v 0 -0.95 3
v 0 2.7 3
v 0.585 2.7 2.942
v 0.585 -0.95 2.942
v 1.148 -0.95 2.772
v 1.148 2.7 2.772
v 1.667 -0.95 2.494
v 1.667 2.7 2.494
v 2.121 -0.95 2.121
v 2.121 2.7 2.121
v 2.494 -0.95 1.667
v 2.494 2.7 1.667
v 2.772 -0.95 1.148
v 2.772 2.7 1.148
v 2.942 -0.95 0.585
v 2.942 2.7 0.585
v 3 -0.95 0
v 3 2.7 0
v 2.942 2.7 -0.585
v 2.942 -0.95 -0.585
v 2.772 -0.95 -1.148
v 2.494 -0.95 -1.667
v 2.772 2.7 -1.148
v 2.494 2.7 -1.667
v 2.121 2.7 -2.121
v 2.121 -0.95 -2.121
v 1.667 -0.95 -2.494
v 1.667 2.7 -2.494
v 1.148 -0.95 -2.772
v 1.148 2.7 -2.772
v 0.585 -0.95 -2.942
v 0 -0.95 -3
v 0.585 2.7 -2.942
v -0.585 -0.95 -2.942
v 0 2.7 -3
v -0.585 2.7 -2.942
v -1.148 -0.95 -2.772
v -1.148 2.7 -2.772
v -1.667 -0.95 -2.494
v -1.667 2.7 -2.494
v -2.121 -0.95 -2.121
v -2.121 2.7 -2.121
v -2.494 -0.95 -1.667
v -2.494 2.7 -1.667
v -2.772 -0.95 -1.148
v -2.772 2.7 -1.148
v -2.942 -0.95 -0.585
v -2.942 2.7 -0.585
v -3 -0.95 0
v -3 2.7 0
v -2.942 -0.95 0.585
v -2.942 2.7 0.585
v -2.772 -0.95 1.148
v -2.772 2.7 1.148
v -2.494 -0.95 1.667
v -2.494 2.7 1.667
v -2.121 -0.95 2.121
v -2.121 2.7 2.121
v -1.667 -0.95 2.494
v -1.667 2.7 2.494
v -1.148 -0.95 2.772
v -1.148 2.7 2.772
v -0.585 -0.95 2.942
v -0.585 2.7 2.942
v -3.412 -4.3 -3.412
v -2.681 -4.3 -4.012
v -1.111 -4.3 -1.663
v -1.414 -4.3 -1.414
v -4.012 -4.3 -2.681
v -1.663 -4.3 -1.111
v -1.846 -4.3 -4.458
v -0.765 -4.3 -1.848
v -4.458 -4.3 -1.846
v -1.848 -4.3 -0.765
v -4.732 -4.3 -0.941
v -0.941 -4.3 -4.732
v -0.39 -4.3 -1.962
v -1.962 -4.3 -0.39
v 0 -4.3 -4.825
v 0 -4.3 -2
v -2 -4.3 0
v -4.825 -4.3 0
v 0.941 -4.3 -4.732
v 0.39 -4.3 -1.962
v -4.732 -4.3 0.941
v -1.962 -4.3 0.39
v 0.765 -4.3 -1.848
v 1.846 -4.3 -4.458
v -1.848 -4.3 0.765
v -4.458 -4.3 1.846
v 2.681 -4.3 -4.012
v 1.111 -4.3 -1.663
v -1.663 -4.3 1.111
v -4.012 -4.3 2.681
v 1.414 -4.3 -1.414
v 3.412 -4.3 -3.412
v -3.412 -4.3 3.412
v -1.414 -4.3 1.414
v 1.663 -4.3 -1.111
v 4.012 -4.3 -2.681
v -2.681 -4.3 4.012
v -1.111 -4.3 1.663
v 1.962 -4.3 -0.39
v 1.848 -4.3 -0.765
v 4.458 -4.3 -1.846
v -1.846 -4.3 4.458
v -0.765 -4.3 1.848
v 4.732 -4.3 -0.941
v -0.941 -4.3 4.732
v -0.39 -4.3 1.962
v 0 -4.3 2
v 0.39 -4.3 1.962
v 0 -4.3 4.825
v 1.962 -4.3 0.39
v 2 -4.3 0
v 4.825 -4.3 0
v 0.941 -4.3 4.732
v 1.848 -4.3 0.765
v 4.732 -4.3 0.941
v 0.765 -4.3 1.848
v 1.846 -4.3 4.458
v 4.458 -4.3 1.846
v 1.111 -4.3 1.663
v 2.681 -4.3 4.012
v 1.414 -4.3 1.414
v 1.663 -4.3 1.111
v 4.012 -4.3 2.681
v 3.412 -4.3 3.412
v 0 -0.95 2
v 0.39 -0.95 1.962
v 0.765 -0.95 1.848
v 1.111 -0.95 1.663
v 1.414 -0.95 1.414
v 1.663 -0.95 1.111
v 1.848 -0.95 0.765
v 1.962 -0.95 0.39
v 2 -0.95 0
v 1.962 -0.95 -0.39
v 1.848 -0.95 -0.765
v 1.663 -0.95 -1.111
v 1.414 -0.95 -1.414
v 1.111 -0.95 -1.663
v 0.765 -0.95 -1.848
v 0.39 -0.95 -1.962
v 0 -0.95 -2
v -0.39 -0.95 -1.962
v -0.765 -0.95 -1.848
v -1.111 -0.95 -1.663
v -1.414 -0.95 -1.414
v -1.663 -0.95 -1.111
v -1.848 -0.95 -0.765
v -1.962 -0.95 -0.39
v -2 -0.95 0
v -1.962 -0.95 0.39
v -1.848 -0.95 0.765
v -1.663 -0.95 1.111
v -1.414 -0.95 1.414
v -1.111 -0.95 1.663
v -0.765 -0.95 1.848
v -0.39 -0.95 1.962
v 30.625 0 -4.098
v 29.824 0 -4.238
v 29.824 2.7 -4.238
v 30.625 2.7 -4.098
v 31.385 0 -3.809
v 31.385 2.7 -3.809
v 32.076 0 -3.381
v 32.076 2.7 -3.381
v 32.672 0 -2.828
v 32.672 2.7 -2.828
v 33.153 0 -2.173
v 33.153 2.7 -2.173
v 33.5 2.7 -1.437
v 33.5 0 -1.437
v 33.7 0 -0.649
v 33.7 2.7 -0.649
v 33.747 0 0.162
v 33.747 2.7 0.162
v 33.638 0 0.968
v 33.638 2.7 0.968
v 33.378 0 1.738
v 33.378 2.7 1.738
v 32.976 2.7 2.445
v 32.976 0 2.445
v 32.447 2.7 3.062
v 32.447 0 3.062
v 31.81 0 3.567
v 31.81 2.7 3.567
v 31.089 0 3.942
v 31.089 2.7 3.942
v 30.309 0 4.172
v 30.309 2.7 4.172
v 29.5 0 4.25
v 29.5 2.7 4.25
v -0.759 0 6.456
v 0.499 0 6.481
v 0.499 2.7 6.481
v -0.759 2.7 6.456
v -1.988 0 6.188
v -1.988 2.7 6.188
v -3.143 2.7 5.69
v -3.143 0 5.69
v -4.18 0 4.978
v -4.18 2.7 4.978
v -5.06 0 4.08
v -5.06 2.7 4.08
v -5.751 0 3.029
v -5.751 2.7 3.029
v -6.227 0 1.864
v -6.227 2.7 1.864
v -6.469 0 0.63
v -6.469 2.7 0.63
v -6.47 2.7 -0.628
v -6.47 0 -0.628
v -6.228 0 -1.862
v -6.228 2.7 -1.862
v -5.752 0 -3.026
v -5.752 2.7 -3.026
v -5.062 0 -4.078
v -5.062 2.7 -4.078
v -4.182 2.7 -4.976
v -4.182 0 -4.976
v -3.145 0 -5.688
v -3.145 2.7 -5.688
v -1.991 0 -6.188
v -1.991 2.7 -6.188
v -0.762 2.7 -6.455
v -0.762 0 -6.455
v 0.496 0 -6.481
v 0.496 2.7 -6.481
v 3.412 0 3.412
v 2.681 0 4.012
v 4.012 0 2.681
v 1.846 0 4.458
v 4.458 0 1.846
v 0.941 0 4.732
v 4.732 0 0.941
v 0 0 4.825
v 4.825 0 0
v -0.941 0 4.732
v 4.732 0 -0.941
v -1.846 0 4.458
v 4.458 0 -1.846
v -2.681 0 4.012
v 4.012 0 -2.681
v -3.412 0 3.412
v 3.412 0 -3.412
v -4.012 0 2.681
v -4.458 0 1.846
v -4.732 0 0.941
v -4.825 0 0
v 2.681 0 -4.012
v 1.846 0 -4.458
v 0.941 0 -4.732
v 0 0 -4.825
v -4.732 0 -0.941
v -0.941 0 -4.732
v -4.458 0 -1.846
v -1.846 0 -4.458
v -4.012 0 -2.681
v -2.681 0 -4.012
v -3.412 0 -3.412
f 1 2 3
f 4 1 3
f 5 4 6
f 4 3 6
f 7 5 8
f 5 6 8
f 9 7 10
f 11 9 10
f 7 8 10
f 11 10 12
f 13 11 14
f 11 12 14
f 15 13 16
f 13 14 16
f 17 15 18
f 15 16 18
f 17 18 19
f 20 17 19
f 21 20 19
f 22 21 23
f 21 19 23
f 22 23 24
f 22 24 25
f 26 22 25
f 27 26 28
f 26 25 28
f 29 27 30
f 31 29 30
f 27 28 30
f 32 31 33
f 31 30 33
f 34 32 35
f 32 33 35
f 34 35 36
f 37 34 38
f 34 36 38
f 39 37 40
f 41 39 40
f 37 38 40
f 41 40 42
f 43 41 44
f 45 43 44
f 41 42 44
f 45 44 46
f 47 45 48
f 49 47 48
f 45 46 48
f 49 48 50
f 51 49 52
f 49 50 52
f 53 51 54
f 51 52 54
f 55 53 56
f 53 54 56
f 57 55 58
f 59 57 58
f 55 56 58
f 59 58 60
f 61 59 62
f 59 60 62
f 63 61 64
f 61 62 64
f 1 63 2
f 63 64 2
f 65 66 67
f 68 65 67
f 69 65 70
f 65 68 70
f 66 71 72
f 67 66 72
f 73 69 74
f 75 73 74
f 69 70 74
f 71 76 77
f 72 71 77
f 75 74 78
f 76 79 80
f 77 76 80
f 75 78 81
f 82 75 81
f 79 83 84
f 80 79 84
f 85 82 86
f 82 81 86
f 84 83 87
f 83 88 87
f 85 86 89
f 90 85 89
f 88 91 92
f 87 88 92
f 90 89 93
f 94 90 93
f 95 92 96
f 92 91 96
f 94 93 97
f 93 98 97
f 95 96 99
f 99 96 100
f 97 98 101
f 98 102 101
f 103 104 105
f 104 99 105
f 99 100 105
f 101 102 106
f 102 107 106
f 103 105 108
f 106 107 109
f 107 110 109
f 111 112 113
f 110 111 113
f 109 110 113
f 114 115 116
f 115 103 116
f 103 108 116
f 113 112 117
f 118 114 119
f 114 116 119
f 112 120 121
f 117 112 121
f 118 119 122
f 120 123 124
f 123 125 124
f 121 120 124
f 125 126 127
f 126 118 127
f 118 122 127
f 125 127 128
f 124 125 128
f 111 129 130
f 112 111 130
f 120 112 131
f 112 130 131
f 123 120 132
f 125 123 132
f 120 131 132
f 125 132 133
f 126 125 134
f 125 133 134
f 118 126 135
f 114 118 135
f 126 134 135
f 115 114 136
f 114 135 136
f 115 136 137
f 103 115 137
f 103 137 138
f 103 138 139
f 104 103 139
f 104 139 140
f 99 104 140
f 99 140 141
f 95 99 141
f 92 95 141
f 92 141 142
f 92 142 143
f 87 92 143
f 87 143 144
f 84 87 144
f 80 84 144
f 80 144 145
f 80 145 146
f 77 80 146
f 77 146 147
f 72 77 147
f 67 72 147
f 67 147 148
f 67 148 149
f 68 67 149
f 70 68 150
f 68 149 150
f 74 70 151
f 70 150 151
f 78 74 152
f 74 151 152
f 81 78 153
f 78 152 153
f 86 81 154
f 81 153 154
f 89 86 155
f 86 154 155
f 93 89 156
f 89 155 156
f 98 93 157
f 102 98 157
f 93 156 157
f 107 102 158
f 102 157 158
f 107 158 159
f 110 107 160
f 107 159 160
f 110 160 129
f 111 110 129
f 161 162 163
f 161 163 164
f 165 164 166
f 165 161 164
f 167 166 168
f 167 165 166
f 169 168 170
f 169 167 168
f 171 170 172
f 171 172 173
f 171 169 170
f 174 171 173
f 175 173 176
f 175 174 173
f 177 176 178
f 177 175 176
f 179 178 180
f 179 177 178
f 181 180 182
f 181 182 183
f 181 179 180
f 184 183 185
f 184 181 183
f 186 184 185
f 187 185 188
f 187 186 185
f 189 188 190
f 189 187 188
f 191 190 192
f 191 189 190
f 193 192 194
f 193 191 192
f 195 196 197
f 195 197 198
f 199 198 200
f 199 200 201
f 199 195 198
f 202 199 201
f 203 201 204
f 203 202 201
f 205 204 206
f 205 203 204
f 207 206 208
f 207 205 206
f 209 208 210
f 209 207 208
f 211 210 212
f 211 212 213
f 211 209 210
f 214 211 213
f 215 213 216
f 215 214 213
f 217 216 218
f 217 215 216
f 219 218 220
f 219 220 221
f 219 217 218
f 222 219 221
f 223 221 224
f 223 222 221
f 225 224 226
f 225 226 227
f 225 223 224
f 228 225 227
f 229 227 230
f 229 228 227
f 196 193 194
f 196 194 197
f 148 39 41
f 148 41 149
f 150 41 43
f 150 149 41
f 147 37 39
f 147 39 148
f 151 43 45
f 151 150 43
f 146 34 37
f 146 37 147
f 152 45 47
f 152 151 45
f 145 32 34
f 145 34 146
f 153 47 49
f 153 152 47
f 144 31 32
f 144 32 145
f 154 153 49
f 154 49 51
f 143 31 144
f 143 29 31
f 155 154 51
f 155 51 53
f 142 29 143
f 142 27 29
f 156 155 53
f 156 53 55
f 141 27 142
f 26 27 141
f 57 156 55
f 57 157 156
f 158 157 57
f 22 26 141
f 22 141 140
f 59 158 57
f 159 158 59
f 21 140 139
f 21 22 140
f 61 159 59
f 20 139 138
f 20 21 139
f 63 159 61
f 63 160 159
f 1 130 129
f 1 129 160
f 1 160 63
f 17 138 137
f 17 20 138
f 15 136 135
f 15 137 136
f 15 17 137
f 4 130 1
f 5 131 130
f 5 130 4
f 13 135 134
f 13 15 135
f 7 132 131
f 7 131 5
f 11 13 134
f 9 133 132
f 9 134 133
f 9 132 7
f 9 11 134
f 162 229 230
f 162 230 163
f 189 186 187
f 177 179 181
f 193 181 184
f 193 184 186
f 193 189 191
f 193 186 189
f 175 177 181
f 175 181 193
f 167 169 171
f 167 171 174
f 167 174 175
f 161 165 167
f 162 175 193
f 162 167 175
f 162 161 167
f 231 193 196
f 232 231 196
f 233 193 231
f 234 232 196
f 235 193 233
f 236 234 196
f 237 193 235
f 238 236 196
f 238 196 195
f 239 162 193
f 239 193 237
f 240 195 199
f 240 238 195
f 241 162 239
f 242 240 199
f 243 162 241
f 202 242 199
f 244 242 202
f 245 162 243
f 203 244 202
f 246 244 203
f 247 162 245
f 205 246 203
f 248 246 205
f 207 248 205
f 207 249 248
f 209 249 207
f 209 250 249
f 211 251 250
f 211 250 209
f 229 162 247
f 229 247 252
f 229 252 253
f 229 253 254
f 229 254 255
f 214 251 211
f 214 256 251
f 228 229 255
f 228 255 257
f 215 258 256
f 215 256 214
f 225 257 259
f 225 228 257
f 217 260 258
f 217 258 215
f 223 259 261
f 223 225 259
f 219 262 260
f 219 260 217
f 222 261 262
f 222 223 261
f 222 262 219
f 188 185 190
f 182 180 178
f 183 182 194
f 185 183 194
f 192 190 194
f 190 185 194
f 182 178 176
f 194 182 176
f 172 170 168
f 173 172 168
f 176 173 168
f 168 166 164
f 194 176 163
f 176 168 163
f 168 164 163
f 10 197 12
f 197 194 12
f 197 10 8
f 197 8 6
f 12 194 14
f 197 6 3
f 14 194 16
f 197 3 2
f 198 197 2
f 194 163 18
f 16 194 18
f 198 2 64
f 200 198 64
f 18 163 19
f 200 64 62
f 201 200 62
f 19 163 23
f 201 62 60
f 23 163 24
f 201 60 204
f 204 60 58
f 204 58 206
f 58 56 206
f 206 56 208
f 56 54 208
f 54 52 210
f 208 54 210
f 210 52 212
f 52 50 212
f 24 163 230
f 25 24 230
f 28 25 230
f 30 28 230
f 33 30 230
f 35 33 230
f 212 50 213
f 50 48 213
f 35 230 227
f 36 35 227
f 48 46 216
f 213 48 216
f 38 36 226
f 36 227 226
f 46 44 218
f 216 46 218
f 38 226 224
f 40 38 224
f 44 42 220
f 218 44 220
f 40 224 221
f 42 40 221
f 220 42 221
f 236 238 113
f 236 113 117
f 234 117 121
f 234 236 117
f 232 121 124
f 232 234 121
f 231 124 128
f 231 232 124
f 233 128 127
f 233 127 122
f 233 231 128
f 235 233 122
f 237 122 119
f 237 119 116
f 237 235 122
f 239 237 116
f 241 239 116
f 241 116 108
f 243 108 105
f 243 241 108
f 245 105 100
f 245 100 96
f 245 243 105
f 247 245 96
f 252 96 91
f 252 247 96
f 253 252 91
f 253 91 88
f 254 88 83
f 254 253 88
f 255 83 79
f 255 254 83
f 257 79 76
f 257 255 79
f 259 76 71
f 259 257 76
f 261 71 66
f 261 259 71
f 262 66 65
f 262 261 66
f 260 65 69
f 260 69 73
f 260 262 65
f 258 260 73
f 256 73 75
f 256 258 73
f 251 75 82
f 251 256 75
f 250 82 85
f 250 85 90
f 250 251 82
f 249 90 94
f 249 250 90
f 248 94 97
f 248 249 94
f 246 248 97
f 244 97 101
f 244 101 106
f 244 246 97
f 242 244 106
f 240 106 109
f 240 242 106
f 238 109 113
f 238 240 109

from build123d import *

# Parameters (mm, degrees)
RESSALTO_EXTRUS_O1_DEPTH = 2.7
ESBO_O1_6_R              = 4.825
RESSALTO_EXTRUS_O2_DEPTH = 4.3
ESBO_O4_R                = 3
CORTE_EXTRUS_O1_DEPTH    = 3.65
ESBO_O5_R                = 2
CORTE_EXTRUS_O2_DEPTH    = 3.65


with BuildPart() as part:
    # Esboço1 → Ressalto-extrusão1 (new body)
    with BuildSketch(Plane(origin=(0, 0, 0), x_dir=(1, 0, 0), z_dir=(0, 1, 0))):
        with BuildLine():
            Line((0.495762712, 6.481066219), (29.824152542, 4.23762022))
            ThreePointArc((29.824152542, 4.23762022), (33.746903927, -0.162194428), (29.5, -4.25))
            Line((29.5, -4.25), (0.498520942, -6.48085464))
            ThreePointArc((0.498520942, -6.48085464), (-6.499999853, -0.001383166), (0.495762712, 6.481066219))
        make_face()
    extrude(amount=RESSALTO_EXTRUS_O1_DEPTH)

    # Esboço1<6> → Ressalto-extrusão2 (add)
    with BuildSketch(Plane(origin=(0, 0, 0), x_dir=(1, 0, 0), z_dir=(0, 1, 0))):
        Circle(ESBO_O1_6_R)
    extrude(amount=-RESSALTO_EXTRUS_O2_DEPTH)

    # Esboço4 → Corte-extrusão1 (cut)
    with BuildSketch(Plane(origin=(0, 2.7, 0), x_dir=(1, 0, 0), z_dir=(0, 1, 0))):
        Circle(ESBO_O4_R)
    extrude(amount=-CORTE_EXTRUS_O1_DEPTH, mode=Mode.SUBTRACT)

    # Esboço5 → Corte-extrusão2 (cut)
    with BuildSketch(Plane(origin=(0, -0.95, 0), x_dir=(1, 0, 0), z_dir=(0, 1, 0))):
        Circle(ESBO_O5_R)
    extrude(amount=-CORTE_EXTRUS_O2_DEPTH, mode=Mode.SUBTRACT)


solid = part.part
